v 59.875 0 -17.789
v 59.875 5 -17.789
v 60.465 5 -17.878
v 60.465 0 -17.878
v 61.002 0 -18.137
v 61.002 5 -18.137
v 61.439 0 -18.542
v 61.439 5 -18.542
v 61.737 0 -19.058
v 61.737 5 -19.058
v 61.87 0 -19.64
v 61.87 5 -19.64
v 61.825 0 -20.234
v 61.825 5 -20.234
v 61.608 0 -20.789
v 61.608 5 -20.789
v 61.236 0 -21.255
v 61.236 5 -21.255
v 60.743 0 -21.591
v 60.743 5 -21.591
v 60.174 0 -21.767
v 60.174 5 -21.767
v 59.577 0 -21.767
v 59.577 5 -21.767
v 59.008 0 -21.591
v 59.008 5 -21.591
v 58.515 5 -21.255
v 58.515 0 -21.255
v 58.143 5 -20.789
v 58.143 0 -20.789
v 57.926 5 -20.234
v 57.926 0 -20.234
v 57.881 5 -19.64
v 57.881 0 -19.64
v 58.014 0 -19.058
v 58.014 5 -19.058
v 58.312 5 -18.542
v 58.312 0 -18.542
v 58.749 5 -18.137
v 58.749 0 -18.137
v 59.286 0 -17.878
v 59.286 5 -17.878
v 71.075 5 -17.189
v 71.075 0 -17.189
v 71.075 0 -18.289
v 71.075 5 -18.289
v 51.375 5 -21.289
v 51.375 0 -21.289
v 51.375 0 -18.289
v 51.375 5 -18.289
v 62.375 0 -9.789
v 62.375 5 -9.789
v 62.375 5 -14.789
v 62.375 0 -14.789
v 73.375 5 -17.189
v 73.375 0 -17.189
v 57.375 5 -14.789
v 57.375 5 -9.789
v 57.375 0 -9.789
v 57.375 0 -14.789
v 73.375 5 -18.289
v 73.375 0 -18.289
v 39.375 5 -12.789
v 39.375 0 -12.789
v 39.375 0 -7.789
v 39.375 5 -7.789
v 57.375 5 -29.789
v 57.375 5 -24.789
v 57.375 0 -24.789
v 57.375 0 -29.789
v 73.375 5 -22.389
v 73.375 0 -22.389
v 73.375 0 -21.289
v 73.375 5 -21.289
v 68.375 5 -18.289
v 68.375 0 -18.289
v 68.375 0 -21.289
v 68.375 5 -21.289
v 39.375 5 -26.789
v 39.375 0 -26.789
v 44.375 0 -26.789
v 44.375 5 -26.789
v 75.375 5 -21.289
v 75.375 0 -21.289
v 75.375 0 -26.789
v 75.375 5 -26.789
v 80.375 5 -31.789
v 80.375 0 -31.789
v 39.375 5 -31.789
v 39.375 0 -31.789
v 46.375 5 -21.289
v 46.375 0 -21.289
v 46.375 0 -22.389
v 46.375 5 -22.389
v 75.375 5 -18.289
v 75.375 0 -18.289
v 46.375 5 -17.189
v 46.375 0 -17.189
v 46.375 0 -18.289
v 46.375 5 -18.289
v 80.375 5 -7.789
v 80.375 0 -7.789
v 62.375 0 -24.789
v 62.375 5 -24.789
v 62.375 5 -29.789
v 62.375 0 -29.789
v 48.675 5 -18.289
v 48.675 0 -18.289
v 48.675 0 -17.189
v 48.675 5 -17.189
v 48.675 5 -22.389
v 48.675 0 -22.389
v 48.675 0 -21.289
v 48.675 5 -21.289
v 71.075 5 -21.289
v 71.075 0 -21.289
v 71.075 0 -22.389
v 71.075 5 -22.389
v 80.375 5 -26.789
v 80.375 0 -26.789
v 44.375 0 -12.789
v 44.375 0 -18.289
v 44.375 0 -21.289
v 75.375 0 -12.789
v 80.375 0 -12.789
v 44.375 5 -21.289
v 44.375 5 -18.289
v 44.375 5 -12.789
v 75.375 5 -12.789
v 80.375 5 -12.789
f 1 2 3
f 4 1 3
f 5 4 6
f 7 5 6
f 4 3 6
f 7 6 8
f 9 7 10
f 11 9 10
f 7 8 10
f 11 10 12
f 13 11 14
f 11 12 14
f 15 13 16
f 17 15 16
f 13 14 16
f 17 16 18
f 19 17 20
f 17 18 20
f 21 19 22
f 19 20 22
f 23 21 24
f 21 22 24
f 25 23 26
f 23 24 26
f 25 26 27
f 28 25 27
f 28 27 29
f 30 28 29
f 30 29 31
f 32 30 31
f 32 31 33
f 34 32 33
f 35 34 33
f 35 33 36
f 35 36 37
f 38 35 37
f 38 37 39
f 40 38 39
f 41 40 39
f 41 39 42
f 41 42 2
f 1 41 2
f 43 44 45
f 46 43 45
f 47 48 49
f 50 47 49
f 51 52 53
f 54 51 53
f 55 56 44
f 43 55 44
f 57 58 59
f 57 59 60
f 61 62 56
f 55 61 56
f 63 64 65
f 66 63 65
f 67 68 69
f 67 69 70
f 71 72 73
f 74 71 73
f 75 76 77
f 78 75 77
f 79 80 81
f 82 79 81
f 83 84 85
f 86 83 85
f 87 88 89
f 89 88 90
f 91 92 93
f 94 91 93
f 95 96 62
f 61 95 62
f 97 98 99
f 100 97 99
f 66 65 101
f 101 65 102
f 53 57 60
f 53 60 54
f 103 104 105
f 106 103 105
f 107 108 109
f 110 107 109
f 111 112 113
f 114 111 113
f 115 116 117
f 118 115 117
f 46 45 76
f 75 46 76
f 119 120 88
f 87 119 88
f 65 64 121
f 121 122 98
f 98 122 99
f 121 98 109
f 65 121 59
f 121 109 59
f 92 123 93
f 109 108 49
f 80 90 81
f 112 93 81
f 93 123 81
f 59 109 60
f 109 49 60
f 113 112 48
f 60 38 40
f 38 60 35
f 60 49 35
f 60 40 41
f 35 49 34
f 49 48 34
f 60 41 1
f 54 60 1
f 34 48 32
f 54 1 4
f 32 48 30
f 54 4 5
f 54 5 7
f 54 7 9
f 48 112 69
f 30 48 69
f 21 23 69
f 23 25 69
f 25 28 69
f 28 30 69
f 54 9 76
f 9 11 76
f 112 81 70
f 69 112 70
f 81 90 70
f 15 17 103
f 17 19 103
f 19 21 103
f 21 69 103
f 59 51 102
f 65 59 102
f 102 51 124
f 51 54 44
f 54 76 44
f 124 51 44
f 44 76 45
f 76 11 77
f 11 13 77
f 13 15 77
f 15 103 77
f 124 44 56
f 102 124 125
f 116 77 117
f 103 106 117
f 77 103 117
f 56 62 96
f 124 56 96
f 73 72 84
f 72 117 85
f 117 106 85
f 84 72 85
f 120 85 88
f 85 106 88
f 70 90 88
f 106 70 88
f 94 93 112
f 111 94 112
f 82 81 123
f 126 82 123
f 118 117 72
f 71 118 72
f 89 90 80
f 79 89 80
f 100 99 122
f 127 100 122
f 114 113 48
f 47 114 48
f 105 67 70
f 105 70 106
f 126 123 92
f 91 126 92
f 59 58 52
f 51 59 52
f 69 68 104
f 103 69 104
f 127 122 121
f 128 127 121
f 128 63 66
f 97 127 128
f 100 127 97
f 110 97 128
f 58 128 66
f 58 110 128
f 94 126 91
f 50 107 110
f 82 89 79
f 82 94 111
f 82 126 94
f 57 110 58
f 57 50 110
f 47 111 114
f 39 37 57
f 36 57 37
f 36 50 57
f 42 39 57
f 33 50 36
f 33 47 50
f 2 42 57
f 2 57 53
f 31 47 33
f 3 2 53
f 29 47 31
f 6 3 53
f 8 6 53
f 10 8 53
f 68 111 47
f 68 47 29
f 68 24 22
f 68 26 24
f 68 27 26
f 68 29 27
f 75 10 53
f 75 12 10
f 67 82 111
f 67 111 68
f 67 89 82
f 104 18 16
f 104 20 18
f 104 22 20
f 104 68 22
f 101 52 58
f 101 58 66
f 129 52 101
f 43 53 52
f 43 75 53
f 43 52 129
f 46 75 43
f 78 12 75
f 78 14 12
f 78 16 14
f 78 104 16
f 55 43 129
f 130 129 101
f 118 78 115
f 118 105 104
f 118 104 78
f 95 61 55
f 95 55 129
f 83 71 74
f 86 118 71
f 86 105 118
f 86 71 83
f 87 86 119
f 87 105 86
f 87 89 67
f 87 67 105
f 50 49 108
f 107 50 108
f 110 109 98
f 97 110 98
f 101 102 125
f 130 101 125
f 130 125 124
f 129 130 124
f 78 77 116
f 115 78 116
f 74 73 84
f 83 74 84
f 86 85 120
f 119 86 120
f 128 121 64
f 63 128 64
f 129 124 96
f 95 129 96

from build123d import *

# Parameters (mm, degrees)
BOSS_EXTRUDE1_DEPTH = 5
SKETCH2_R           = 2
SKETCH2_W           = 5
SKETCH2_H           = 5
CUT_EXTRUDE1_DEPTH  = 10


with BuildPart() as part:
    # Sketch1 → Boss-Extrude1 (new body)
    with BuildSketch(Plane(origin=(0, 0, 0), x_dir=(1, 0, 0), z_dir=(0, 1, 0))):
        Polygon((44.375484097, 7.788988346), (75.375484097, 7.788988346), (80.375484097, 7.788988346), (80.375484097, 12.788988346), (75.375484097, 12.788988346), (75.375484097, 18.288988346), (73.375484097, 18.288988346), (73.375484097, 17.188988346), (71.075484097, 17.188988346), (71.075484097, 18.288988346), (68.375484097, 18.288988346), (68.375484097, 21.288988346), (71.075484097, 21.288988346), (71.075484097, 22.388988346), (73.375484097, 22.388988346), (73.375484097, 21.288988346), (75.375484097, 21.288988346), (75.375484097, 26.788988346), (80.375484097, 26.788988346), (80.375484097, 31.788988346), (75.375484097, 31.788988346), (44.375484097, 31.788988346), (39.375484097, 31.788988346), (39.375484097, 26.788988346), (44.375484097, 26.788988346), (44.375484097, 21.288988346), (46.375484097, 21.288988346), (46.375484097, 22.388988346), (48.675484097, 22.388988346), (48.675484097, 21.288988346), (51.375484097, 21.288988346), (51.375484097, 18.288988346), (48.675484097, 18.288988346), (48.675484097, 17.188988346), (46.375484097, 17.188988346), (46.375484097, 18.288988346), (44.375484097, 18.288988346), (44.375484097, 12.788988346), (39.375484097, 12.788988346), (39.375484097, 7.788988346), align=None)
    extrude(amount=BOSS_EXTRUDE1_DEPTH)

    # Sketch2 → Cut-Extrude1 (cut)
    with BuildSketch(Plane(origin=(0, 5, 0), x_dir=(1, 0, 0), z_dir=(0, 1, 0))):
        with Locations(Location((59.875484097, 19.788988346, 0), (0, 0, 270))):
            Circle(SKETCH2_R)
        with Locations((59.875484097, 12.288988346)):
            Rectangle(SKETCH2_W, SKETCH2_H)
        with Locations((59.875484097, 27.288988346)):
            Rectangle(SKETCH2_W, SKETCH2_H)
    extrude(amount=-CUT_EXTRUDE1_DEPTH, mode=Mode.SUBTRACT)


solid = part.part
